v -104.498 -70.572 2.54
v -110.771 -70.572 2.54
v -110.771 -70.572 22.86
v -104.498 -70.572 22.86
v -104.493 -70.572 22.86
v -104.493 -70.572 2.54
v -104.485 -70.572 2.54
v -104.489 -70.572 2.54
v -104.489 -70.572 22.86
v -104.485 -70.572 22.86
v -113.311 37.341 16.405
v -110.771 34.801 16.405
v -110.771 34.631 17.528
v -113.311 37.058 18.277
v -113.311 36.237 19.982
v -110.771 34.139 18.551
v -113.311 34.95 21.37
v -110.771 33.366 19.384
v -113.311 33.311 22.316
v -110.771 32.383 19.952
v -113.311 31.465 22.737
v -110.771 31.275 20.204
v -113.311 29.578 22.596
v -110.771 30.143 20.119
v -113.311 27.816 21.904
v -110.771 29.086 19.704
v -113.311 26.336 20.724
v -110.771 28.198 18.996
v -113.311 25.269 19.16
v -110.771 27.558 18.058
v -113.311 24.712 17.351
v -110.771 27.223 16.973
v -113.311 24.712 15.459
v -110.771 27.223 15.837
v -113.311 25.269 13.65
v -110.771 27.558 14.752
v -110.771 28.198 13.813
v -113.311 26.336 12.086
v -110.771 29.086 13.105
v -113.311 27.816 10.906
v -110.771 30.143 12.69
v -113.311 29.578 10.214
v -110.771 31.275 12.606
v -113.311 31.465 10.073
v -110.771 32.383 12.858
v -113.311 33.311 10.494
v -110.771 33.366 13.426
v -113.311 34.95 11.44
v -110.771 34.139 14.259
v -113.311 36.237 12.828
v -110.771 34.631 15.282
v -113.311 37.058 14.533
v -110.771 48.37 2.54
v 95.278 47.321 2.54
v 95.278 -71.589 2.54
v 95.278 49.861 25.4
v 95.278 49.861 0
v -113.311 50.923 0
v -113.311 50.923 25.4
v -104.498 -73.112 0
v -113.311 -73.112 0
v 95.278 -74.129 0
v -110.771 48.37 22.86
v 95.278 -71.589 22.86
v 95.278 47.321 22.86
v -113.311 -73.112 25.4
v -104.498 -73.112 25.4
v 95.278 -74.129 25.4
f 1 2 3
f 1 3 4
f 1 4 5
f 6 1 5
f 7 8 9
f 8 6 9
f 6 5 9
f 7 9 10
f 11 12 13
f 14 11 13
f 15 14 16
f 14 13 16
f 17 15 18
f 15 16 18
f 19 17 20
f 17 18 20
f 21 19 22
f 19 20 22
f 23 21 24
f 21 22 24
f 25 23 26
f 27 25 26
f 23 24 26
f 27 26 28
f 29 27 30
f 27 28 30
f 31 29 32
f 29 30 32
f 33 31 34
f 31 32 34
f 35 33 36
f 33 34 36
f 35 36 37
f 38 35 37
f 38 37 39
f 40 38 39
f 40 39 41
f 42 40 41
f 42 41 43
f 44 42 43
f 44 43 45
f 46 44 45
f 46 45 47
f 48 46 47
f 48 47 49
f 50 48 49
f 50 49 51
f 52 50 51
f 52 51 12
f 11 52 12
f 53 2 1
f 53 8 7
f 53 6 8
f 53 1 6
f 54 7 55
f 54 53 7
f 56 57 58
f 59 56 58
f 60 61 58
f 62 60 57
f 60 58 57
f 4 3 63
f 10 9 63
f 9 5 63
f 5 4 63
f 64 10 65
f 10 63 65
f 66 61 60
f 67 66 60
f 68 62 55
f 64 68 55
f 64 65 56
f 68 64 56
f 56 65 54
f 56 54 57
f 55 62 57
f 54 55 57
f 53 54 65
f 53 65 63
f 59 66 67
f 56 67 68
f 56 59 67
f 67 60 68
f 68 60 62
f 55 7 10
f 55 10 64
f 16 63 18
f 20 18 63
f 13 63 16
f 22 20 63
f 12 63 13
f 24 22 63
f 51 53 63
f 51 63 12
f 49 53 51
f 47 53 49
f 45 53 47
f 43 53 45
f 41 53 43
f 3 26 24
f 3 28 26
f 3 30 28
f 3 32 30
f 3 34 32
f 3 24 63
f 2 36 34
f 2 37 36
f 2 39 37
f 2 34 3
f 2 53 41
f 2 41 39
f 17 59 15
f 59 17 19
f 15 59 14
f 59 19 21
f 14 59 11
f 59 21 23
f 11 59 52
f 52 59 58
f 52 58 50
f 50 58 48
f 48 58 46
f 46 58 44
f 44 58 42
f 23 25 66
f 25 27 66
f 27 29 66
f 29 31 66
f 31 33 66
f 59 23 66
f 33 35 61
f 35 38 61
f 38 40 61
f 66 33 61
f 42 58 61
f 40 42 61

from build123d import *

# Parameters (mm, degrees)
F1_DEPTH       = 25.4
F3_T           = -2.54
F4_D           = 6.35
F4_DEPTH       = 12.7
F4_CSINK_D     = 12.7
F4_CSINK_ANGLE = 90


with BuildPart() as f1:
    # F0 (on Top) → F1 (new body)
    with BuildSketch(Plane.XY):
        Polygon((95.277585, 49.860638), (-113.311097, 50.922569), (-113.311097, -73.111692), (-104.497745, -73.111692), (95.277585, -74.128754), align=None)
    extrude(amount=F1_DEPTH)

    # F3
    f3_openings = [f1.faces().sort_by_distance(p)[0] for p in [
        (95.277585, -12.134058, 12.7),
    ]]
    offset(amount=F3_T, openings=f3_openings)

    # F4
    with Locations(Plane(origin=(-113.311097, 0, 0), x_dir=(0, -1, 0), z_dir=(-1, 0, 0))):
        with Locations((-30.990601, 16.404929)):
            CounterSinkHole(F4_D / 2, F4_CSINK_D / 2, depth=F4_DEPTH, counter_sink_angle=F4_CSINK_ANGLE)


solid = f1.part
